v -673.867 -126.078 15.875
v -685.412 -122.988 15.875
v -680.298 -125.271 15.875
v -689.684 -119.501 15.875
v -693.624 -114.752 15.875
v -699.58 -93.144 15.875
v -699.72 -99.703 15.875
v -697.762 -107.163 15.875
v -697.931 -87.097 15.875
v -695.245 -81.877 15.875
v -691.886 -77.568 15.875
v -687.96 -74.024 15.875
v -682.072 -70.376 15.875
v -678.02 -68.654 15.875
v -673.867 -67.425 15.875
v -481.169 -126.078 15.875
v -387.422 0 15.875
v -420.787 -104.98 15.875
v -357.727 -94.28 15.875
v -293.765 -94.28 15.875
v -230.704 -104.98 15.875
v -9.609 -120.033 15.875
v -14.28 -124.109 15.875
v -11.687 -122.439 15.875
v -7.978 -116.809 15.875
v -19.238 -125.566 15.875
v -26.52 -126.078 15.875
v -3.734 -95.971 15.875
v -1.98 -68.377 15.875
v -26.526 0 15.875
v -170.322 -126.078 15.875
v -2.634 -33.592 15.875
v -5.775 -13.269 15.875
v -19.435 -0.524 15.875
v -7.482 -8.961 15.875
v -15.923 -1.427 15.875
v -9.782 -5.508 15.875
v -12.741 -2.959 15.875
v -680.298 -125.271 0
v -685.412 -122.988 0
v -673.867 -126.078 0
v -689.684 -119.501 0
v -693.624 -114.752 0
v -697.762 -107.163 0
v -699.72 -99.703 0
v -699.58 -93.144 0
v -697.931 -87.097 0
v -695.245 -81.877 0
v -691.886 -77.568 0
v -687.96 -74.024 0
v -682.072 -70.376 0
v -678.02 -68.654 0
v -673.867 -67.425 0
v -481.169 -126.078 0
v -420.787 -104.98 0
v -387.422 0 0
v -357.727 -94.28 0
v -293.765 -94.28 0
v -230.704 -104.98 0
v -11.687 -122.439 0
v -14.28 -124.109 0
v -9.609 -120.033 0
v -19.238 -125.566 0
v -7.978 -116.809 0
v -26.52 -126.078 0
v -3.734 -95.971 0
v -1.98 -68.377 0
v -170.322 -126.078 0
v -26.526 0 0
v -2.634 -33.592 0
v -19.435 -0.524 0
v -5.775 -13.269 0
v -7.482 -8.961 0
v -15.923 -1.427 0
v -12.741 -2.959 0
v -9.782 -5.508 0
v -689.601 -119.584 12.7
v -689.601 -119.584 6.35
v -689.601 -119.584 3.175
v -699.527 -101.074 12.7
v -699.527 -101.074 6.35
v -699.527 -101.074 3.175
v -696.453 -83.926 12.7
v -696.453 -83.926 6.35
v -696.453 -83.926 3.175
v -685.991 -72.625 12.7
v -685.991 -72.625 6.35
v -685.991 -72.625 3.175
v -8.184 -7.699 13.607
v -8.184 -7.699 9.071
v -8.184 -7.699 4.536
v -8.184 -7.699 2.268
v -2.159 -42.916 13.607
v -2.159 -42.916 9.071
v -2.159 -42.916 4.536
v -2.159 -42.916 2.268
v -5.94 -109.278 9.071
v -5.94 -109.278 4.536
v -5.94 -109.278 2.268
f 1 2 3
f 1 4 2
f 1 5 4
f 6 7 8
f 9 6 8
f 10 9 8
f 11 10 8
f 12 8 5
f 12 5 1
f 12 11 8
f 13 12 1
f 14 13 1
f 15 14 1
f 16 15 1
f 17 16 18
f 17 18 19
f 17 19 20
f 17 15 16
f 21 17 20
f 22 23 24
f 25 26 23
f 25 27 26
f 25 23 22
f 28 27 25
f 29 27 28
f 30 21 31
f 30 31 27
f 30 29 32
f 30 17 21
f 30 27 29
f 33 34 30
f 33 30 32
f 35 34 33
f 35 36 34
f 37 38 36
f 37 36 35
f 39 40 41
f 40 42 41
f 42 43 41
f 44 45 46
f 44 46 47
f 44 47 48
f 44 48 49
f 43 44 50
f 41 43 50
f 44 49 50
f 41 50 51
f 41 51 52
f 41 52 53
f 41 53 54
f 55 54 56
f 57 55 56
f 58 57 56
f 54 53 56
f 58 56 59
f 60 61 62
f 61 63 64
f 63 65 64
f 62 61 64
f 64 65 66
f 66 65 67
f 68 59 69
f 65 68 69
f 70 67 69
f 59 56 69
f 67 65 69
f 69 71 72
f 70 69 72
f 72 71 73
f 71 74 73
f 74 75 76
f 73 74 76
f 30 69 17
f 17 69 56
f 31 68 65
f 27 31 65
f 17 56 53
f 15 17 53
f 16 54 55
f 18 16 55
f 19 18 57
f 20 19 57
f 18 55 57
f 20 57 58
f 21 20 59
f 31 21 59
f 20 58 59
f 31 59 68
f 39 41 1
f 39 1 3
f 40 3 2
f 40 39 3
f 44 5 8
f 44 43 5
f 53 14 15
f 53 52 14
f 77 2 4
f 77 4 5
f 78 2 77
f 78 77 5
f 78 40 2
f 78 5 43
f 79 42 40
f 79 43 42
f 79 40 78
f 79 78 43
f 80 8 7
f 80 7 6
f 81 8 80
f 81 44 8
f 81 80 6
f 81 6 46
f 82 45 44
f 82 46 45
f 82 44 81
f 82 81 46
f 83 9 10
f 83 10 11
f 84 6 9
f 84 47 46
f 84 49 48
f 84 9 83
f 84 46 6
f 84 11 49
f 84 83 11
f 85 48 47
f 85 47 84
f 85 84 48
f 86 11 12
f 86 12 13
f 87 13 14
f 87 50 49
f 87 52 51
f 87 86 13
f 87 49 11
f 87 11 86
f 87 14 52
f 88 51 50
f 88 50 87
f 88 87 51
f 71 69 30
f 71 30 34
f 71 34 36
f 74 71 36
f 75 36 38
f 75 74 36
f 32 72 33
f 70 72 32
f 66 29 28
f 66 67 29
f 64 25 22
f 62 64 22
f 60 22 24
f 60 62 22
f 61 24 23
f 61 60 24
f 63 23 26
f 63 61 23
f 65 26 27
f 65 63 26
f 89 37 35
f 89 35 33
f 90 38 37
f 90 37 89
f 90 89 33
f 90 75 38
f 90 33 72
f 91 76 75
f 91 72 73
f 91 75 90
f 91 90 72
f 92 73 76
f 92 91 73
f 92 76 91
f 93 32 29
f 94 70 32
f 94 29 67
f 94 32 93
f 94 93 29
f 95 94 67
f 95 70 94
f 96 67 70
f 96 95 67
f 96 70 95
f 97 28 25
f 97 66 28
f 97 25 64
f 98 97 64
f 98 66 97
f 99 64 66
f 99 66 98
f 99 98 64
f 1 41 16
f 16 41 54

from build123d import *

# Parameters (mm, degrees)
F1_DEPTH = 15.875


with BuildPart() as f1:
    # F0 (on Top) → F1 (new body)
    with BuildSketch(Plane.XY):
        with BuildLine():
            ThreePointArc((-481.1693131924, -126.0784417391), (-325.7457315922, -92.9354673726), (-170.322149992, -126.0784417391))
            Line((-170.322149992, -126.0784417391), (-26.5201553702, -126.0784417391))
            add(Edge.make_bspline(
                [(-26.5264435702, 0), (-22.8012421009, 0), (-15.0441017893, -0.5887992114), (-4.523946909, -8.9224252488), (-1.2848955026, -43.9818290546), (-2.1464601557, -87.8940737216), (-5.5661619574, -108.40773937), (-8.9017204849, -121.9981720552), (-16.2298362702, -126.0784417391), (-26.5201553702, -126.0784417391)],
                knots=[0, 0, 0, 0, 0.1056347615, 0.2117991211, 0.3978072021, 0.6134774938, 0.757740991, 0.8658398185, 1, 1, 1, 1], degree=3))
            Line((-26.5264435702, 0), (-387.4219655997, 0))
            Line((-387.4219655997, 0), (-673.8674044609, -67.4248912098))
            add(Edge.make_bspline(
                [(-673.8674044609, -126.0784417391), (-679.4637585278, -126.0784417391), (-689.3936109441, -122.8120563291), (-702.6431348794, -101.4660306081), (-697.3032288028, -82.4590973372), (-686.6043829366, -71.9639539657), (-678.059783005, -68.411713232), (-673.8674044609, -67.4248912098)],
                knots=[0, 0, 0, 0, 0.1911647208, 0.4255862046, 0.63563501, 0.8219403923, 1, 1, 1, 1], degree=3))
            Line((-673.8674044609, -126.0784417391), (-481.1693131924, -126.0784417391))
        make_face()
    extrude(amount=F1_DEPTH)


solid = f1.part
